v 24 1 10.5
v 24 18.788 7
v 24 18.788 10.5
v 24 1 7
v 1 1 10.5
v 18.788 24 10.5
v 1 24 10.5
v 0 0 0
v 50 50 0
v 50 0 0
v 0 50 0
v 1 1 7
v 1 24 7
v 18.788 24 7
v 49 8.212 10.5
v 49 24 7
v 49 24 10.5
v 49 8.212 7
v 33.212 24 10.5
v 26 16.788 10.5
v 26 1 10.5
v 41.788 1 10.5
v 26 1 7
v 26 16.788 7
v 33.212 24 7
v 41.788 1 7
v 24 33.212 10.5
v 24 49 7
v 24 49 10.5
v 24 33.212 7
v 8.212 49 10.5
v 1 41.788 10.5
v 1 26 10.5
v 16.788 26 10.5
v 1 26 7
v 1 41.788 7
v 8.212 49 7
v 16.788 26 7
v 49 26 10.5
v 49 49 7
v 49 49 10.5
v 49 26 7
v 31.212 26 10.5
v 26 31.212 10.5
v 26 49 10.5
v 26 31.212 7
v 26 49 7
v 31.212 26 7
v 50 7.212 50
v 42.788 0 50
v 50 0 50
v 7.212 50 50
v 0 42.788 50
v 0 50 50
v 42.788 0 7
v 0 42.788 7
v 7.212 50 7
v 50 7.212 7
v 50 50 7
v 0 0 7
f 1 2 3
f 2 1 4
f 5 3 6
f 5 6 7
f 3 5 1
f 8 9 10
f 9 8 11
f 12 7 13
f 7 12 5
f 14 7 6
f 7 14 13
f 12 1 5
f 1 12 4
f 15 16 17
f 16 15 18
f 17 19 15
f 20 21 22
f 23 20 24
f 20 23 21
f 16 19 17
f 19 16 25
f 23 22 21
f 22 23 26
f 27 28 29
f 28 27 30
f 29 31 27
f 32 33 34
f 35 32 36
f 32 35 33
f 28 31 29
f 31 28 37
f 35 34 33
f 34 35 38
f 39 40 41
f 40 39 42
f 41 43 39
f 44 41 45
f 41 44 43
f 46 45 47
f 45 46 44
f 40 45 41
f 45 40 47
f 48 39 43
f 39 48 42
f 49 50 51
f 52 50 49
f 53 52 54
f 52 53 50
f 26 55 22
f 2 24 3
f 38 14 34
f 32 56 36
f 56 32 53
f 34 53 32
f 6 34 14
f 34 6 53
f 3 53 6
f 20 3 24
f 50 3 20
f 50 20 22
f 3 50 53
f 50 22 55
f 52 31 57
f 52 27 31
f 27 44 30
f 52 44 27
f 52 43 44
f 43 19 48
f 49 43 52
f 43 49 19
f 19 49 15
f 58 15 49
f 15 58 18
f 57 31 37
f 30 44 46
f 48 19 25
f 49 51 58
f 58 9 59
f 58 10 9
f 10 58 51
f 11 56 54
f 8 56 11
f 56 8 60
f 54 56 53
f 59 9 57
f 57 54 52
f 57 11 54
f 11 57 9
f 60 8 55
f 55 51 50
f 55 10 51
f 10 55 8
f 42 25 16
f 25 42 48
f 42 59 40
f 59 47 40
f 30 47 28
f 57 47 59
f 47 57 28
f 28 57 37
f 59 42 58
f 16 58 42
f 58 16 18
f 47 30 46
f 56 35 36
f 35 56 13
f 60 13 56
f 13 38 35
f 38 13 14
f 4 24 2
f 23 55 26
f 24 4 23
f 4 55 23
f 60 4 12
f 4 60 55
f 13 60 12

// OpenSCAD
color("LightGray") {
    translate([1,1,0]) cube([23,23,6+4.5]);
    translate([25+1,1,0]) cube([23,23,6+4.5]);
    translate([1,25+1,0]) cube([23,23,6+4.5]);
    translate([25+1,25+1,0]) cube([23,23,6+4.5]);
}
color("Grey") {
    cube([50,50,6+1]);
    intersection() {
        translate([50+sqrt(10.2*10.2*2)/2,0,0]) rotate([0,0,90+45]) cube([80,10.2,50]);
        cube([50,50,50]);
    }
}
